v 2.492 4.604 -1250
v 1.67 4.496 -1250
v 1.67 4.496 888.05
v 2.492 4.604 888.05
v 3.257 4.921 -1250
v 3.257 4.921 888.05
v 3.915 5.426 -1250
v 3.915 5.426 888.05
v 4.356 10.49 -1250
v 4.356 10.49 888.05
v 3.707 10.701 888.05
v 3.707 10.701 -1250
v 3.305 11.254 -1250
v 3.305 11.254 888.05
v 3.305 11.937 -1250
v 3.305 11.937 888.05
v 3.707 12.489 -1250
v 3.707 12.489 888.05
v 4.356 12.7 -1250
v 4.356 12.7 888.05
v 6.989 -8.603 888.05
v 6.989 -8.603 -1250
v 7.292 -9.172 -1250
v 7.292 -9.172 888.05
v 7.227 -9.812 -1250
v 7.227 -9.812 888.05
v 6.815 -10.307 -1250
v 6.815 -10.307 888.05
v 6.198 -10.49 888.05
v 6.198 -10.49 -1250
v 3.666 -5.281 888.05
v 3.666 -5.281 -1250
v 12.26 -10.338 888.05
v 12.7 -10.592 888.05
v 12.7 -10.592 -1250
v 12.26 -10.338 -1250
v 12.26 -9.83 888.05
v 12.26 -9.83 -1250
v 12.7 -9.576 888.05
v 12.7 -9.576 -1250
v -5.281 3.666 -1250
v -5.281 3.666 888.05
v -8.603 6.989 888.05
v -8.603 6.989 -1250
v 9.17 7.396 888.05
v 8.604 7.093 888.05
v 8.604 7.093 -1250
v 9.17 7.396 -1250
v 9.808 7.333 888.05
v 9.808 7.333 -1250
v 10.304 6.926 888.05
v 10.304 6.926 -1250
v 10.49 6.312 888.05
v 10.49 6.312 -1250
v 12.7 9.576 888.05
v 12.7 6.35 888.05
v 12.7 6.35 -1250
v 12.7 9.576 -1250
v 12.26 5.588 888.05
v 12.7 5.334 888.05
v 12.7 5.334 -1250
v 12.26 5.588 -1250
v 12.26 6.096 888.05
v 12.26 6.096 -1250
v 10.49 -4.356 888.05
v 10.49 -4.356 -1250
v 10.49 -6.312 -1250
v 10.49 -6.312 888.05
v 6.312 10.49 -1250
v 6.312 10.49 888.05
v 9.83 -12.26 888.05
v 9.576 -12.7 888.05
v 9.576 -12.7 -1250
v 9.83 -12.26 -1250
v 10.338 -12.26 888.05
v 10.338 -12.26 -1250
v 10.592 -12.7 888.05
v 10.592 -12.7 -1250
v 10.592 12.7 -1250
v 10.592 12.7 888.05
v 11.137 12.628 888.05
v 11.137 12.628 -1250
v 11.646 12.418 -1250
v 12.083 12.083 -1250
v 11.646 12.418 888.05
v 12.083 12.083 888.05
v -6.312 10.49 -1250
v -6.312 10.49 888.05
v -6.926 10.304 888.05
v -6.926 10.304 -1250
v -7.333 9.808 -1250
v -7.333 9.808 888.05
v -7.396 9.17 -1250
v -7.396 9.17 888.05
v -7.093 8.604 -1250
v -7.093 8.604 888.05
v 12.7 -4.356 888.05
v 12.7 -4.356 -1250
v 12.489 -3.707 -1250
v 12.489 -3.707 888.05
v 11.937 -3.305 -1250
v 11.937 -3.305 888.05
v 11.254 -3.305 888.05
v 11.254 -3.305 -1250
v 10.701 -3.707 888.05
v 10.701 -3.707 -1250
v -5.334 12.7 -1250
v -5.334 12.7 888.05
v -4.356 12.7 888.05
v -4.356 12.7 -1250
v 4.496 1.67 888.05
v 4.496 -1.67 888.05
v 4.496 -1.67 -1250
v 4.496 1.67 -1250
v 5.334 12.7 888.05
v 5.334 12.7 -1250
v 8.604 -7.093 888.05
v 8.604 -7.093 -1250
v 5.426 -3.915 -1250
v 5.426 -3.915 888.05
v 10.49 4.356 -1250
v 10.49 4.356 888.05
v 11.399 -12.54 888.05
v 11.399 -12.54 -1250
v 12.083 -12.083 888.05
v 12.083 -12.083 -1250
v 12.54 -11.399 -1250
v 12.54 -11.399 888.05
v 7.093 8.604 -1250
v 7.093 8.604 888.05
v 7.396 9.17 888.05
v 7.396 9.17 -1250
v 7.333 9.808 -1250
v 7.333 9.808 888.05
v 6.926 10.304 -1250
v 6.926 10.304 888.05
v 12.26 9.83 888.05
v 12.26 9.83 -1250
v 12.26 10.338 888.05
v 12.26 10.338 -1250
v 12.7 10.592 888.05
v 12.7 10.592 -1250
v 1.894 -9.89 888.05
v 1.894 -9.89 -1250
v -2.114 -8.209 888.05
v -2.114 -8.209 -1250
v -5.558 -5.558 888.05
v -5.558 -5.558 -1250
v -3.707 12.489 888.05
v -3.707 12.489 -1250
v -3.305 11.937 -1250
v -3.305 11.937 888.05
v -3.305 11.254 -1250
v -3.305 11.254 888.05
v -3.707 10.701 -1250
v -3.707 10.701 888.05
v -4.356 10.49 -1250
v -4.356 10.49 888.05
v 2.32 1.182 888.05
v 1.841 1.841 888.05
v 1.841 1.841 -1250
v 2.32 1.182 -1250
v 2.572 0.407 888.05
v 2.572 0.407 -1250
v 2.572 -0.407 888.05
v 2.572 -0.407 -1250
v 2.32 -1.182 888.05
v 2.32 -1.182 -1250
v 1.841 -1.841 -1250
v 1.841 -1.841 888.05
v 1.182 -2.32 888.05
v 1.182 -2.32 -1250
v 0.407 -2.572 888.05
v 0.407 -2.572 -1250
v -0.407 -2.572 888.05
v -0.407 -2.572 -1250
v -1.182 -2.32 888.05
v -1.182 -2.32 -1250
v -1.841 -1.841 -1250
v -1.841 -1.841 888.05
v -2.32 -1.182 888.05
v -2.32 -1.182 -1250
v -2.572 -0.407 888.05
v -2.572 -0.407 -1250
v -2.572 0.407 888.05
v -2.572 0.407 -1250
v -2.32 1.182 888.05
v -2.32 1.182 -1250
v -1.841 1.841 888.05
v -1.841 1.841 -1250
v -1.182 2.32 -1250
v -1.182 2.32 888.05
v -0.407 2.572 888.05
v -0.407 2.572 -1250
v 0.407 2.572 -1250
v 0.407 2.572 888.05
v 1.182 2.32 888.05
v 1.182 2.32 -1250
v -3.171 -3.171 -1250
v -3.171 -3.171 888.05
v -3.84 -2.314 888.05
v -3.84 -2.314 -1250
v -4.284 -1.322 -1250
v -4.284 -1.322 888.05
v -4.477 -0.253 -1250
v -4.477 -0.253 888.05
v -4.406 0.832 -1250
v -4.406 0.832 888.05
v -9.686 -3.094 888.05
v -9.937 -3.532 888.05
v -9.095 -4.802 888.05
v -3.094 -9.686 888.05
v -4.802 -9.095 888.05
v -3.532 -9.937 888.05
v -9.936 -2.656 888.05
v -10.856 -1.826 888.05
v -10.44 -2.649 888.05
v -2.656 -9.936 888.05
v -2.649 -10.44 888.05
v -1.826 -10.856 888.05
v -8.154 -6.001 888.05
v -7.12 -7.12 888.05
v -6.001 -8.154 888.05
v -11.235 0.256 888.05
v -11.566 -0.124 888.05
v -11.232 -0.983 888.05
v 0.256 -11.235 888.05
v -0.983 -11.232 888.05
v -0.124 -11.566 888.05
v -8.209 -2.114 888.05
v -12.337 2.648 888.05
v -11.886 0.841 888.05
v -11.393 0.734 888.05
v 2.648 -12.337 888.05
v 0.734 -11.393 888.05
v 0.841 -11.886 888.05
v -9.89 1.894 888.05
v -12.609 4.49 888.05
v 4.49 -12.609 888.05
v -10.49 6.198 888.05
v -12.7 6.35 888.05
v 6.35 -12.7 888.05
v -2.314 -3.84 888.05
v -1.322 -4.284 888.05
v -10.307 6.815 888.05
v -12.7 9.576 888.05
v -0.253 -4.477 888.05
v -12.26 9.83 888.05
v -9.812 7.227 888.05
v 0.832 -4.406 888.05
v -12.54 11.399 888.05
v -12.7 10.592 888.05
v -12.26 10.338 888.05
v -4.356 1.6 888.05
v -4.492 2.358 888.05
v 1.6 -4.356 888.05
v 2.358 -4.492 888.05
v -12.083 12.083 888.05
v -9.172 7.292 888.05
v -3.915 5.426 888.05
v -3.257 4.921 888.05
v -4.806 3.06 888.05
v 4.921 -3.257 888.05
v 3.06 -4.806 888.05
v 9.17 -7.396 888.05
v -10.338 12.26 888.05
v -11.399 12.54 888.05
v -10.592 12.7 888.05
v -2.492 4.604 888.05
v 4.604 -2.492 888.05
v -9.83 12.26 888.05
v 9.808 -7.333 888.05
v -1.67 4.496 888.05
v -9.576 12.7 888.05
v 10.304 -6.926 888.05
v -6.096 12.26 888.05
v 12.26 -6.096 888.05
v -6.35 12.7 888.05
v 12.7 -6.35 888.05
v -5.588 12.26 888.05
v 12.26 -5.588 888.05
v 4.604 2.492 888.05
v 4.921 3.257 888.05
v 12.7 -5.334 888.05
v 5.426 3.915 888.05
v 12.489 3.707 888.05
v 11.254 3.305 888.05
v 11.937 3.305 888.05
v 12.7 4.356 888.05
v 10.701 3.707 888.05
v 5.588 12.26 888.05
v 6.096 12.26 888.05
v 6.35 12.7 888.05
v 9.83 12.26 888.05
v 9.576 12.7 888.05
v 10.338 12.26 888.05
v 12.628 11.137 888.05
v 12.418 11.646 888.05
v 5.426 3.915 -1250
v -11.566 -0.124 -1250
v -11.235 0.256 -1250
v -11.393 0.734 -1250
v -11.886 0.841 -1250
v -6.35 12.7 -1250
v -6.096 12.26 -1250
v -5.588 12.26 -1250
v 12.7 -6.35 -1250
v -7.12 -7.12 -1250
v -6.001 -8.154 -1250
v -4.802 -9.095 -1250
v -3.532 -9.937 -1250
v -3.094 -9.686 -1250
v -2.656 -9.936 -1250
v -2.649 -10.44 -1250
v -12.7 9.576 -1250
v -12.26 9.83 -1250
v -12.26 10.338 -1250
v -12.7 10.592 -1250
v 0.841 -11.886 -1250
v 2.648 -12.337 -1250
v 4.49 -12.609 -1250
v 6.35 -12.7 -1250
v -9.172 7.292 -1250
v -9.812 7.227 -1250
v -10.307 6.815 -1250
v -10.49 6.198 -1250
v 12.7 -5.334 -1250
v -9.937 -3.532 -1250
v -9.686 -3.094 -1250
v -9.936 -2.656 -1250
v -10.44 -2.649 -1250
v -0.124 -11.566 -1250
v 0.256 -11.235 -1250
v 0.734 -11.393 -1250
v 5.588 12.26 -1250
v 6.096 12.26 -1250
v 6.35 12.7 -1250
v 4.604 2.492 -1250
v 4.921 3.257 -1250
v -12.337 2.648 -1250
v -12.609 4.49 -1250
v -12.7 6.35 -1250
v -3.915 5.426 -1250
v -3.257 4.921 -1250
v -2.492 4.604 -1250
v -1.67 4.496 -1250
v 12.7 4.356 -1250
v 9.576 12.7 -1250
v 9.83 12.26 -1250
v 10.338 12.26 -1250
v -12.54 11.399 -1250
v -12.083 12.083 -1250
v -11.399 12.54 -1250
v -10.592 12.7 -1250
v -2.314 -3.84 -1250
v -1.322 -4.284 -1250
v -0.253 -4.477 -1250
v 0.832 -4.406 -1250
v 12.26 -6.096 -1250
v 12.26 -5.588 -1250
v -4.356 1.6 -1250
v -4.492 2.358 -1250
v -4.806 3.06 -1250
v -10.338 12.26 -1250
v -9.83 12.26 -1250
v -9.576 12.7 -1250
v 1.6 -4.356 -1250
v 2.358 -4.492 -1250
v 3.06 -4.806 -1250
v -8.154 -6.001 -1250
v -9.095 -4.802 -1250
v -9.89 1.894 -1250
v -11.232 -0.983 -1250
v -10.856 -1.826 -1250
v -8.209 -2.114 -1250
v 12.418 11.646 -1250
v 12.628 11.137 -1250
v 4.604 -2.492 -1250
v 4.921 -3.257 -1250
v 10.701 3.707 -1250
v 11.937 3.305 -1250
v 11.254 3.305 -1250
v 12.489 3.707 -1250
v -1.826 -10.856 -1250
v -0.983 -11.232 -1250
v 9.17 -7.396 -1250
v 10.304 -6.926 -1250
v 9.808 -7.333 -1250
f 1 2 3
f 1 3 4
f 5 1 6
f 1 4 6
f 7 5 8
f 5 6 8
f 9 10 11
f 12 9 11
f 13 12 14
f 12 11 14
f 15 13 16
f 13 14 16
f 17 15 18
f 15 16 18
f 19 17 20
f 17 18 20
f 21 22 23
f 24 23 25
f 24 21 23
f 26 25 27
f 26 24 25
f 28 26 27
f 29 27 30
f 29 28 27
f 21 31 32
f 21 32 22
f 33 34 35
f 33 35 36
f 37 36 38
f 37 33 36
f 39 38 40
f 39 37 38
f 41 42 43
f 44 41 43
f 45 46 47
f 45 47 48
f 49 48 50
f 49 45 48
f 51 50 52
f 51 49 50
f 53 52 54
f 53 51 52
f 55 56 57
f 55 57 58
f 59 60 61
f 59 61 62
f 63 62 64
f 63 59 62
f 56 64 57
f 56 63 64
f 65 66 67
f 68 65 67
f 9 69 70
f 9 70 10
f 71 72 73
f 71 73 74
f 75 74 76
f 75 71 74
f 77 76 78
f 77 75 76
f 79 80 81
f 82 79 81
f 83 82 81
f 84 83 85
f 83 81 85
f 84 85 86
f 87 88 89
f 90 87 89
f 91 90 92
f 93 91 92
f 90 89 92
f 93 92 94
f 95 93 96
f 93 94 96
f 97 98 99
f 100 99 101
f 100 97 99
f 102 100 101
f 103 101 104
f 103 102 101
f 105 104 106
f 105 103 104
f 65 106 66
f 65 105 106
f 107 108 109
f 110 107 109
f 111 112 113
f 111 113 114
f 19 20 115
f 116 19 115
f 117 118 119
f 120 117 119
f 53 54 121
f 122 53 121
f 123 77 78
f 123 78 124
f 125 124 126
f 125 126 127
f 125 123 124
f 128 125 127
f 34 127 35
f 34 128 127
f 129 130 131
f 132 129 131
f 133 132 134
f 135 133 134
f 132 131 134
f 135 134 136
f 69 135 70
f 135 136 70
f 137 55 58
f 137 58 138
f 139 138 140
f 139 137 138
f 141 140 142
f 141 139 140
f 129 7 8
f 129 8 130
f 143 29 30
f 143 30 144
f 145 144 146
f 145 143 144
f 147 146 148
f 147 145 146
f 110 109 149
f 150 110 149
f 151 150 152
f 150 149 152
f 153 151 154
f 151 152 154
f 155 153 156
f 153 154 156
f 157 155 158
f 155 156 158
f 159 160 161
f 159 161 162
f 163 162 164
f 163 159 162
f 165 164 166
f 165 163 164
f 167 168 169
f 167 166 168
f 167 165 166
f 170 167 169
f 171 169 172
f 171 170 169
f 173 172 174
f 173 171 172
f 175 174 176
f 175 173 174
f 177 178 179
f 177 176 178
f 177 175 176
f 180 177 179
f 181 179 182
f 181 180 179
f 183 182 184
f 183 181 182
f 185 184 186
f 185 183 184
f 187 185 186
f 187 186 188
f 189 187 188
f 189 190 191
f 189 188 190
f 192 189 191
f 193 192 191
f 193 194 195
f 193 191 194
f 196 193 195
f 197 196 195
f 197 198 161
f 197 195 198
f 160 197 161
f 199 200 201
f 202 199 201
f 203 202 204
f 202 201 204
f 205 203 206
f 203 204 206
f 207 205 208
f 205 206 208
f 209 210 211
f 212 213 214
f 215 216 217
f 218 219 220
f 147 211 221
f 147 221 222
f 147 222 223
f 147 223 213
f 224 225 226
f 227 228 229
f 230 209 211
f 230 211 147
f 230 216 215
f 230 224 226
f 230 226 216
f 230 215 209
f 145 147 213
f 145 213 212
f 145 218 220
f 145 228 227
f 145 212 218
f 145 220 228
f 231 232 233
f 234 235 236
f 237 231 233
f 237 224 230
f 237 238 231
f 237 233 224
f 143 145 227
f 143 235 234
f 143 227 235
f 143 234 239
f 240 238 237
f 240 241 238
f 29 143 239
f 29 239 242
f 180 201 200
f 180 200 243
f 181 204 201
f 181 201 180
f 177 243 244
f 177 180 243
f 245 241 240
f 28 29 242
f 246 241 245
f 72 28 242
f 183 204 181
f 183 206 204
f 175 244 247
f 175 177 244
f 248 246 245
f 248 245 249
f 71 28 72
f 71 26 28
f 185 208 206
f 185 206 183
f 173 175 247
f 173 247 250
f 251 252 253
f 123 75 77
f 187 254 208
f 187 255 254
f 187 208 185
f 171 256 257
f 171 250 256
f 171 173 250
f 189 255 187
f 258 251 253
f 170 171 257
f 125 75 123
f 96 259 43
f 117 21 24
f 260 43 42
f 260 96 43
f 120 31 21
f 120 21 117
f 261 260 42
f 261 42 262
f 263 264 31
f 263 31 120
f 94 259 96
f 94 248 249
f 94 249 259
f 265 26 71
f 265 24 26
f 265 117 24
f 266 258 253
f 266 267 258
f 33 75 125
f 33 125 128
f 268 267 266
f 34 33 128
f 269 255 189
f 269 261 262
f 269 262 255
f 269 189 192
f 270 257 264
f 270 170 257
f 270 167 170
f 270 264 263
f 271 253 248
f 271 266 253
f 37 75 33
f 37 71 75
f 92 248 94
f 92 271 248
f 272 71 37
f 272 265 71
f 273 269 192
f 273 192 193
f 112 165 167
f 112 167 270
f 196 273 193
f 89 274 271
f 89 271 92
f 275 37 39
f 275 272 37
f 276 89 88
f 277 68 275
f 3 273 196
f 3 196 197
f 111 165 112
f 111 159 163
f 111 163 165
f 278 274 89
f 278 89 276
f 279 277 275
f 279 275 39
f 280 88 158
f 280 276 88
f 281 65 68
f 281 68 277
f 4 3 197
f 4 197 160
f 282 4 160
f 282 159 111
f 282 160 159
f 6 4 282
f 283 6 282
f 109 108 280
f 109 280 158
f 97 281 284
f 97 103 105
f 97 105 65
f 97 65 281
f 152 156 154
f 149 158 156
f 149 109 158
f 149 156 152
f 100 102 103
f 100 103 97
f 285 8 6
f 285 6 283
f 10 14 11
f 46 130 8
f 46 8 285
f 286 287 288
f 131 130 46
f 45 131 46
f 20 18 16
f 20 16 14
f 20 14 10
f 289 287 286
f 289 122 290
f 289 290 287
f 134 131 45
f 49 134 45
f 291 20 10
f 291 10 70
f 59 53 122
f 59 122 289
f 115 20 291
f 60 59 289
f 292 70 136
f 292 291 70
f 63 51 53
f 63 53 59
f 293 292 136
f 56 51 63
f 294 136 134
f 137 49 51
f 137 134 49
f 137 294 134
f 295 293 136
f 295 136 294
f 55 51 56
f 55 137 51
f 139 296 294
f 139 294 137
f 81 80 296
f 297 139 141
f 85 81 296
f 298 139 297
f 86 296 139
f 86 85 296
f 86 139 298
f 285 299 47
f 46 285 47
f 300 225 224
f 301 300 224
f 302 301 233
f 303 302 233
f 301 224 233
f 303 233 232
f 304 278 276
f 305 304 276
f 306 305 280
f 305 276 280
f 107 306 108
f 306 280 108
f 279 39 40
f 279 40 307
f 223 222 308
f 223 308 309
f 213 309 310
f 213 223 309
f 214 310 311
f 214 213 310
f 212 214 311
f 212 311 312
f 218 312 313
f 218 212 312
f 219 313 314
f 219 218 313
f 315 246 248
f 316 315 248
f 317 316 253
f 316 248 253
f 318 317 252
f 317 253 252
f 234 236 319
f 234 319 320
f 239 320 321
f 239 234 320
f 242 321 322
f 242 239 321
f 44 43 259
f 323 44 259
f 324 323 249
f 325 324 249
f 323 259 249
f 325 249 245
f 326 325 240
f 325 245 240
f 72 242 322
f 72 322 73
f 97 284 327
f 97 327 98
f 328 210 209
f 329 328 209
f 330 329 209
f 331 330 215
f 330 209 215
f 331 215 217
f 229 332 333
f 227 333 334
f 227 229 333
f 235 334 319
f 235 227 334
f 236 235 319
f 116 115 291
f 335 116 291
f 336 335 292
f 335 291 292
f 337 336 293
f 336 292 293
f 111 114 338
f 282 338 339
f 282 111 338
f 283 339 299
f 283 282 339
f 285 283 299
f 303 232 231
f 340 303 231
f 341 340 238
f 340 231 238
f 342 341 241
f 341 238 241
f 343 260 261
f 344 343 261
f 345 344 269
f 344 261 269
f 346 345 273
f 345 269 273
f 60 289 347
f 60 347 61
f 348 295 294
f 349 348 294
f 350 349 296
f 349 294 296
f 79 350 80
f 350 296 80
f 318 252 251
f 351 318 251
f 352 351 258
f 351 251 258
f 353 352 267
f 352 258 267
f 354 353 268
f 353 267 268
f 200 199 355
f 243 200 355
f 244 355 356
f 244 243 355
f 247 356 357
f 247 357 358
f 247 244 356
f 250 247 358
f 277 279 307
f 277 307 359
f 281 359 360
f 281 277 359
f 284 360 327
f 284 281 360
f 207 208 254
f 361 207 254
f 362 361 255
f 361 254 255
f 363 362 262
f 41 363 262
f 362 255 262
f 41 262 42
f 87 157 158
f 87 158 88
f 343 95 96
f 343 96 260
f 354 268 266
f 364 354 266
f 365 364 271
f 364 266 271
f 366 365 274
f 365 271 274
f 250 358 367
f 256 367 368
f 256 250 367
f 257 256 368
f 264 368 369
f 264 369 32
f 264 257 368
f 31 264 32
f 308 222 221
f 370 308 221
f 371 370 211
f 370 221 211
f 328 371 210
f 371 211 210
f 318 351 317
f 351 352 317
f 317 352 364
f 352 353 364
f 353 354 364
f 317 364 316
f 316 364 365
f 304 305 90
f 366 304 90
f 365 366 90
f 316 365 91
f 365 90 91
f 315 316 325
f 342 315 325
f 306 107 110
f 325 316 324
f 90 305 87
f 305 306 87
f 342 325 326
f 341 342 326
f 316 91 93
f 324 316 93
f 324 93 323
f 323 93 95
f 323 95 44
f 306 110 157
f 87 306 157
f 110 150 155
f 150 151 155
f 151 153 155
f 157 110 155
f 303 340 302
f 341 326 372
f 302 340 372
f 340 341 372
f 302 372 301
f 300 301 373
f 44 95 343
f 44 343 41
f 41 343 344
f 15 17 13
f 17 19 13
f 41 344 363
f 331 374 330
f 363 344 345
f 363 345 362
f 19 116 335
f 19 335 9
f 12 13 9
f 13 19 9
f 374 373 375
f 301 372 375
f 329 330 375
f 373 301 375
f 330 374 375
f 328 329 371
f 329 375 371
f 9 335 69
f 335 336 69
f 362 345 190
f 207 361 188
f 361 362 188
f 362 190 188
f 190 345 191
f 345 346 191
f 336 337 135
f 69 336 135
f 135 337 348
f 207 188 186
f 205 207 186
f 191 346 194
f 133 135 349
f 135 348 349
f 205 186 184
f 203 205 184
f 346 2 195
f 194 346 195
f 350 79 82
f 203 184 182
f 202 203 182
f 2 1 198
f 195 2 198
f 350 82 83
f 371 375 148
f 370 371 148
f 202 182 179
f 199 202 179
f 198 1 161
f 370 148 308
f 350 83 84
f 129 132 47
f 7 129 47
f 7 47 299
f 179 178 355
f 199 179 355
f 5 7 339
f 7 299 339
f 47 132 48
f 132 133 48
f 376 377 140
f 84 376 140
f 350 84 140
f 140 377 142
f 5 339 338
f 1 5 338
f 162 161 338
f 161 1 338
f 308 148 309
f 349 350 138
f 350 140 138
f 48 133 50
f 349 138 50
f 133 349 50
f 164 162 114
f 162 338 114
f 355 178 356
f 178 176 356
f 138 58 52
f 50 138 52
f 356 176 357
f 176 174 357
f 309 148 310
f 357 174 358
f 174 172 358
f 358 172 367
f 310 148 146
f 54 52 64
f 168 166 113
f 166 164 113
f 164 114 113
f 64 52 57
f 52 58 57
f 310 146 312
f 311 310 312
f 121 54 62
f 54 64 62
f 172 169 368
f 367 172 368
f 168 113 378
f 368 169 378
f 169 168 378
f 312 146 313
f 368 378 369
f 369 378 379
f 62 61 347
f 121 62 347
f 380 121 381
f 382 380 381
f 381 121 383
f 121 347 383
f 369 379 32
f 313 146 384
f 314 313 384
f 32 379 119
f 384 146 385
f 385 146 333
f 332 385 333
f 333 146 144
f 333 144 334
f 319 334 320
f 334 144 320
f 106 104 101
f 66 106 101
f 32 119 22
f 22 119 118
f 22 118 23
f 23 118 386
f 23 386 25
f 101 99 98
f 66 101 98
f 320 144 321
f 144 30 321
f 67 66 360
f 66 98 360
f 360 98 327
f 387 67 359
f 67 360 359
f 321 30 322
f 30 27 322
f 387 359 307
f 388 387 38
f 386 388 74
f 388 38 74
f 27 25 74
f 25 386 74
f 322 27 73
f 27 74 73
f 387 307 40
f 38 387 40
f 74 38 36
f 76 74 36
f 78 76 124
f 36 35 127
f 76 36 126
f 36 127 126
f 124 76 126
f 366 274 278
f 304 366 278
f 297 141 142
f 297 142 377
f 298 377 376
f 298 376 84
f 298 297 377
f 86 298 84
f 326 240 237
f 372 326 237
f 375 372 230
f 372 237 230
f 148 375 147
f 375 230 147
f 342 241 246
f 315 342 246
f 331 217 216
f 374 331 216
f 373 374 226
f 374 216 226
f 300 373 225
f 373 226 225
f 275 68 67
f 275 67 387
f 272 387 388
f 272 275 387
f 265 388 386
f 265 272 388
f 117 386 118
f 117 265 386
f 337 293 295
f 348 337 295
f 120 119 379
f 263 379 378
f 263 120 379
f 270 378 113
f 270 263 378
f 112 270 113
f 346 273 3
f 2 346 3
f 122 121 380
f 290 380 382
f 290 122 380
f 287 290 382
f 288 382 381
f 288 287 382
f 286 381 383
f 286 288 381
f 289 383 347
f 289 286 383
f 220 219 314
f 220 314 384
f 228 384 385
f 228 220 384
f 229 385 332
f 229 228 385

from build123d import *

# Parameters (mm, degrees)
BOSS_EXTRUDE1_DEPTH = 1250
SKETCH4_R           = 22.750036828
CUT_EXTRUDE1_DEPTH  = 361.95


with BuildPart() as part:
    # Sketch3 → Boss-Extrude1 (new, symmetric)
    with BuildSketch(Plane.XY):
        with BuildLine():
            Line((6.350000091, 12.7), (9.5758, 12.7))
            ThreePointArc((9.5758, 12.7), (10.0838, 12.192), (10.5918, 12.7))
            ThreePointArc((10.5918, 12.7), (11.398573212, 12.53952283), (12.082522516, 12.082522516))
            Line((12.082522516, 12.082522516), (1.841111635, 1.841111635))
            ThreePointArc((1.841111635, 1.841111635), (-1.841111635, 1.841111635), (-1.841111635, -1.841111635))
            Line((-1.841111635, -1.841111635), (-3.170518398, -3.170518398))
            ThreePointArc((-3.170518398, -3.170518398), (-4.284365606, -1.322340795), (-4.405901938, 0.832106923))
            ThreePointArc((-4.405901938, 0.832106923), (-4.49196258, 2.357684911), (-5.280684798, 3.666391103))
            Line((-5.280684798, 3.666391103), (-8.603375093, 6.989081397))
            ThreePointArc((-8.603375093, 6.989081397), (-9.812092525, 7.226672612), (-10.489512256, 6.197814058))
            ThreePointArc((-10.489512256, 6.197814058), (-9.179037358, -0.164701156), (-5.55781952, -5.55781952))
            Line((-5.55781952, -5.55781952), (-7.120384159, -7.120384159))
            ThreePointArc((-7.120384159, -7.120384159), (-8.636327096, -5.410633429), (-9.936651338, -3.531674301))
            ThreePointArc((-9.936651338, -3.531674301), (-9.753165795, -2.842051688), (-10.440280632, -2.649387487))
            ThreePointArc((-10.440280632, -2.649387487), (-11.049200851, -1.406952263), (-11.566334617, -0.123596589))
            ThreePointArc((-11.566334617, -0.123596589), (-11.250376175, 0.51626008), (-11.885963187, 0.840721857))
            ThreePointArc((-11.885963187, 0.840721857), (-12.495391993, 3.565453333), (-12.7, 6.350000091))
            Line((-12.7, 6.350000091), (-12.7, 9.5758))
            ThreePointArc((-12.7, 9.5758), (-12.192, 10.0838), (-12.7, 10.5918))
            ThreePointArc((-12.7, 10.5918), (-12.082522516, 12.082522516), (-10.5918, 12.7))
            ThreePointArc((-10.5918, 12.7), (-10.0838, 12.192), (-9.5758, 12.7))
            Line((-9.5758, 12.7), (-6.350000091, 12.7))
            ThreePointArc((-6.350000091, 12.7), (-5.842000091, 12.192), (-5.334000091, 12.7))
            Line((-5.334000091, 12.7), (-4.3561, 12.7))
            ThreePointArc((-4.3561, 12.7), (-3.2512, 11.5951), (-4.3561, 10.4902))
            Line((-4.3561, 10.4902), (-6.3119, 10.4902))
            ThreePointArc((-6.3119, 10.4902), (-7.332694495, 9.808126924), (-7.093182283, 8.604017717))
            Line((-7.093182283, 8.604017717), (-3.914900535, 5.42573597))
            ThreePointArc((-3.914900535, 5.42573597), (-2.884856402, 4.737482484), (-1.669836505, 4.4958))
            Line((-1.669836505, 4.4958), (1.669836505, 4.4958))
            ThreePointArc((1.669836505, 4.4958), (2.884856402, 4.737482484), (3.914900535, 5.42573597))
            Line((3.914900535, 5.42573597), (7.093182283, 8.604017717))
            ThreePointArc((7.093182283, 8.604017717), (7.332694495, 9.808126924), (6.3119, 10.4902))
            Line((6.3119, 10.4902), (4.3561, 10.4902))
            ThreePointArc((4.3561, 10.4902), (3.2512, 11.5951), (4.3561, 12.7))
            Line((4.3561, 12.7), (5.334000091, 12.7))
            ThreePointArc((5.334000091, 12.7), (5.842000091, 12.192), (6.350000091, 12.7))
        make_face()
    extrude(amount=BOSS_EXTRUDE1_DEPTH, both=True)

    # Mirror1: part across plane


with BuildPart() as part_1:
    add(part.part)
    add(part.part.mirror(Plane(origin=(1.841111635, 1.841111635, 1250), x_dir=(0, 0, 1), z_dir=(-0.707106781186552, 0.707106781186543, 0))))

    # Sketch4 → Cut-Extrude1 (cut)
    with BuildSketch(Plane.XY.offset(1250)):
        Circle(SKETCH4_R)
    extrude(amount=-CUT_EXTRUDE1_DEPTH, mode=Mode.SUBTRACT)


solid = part_1.part
